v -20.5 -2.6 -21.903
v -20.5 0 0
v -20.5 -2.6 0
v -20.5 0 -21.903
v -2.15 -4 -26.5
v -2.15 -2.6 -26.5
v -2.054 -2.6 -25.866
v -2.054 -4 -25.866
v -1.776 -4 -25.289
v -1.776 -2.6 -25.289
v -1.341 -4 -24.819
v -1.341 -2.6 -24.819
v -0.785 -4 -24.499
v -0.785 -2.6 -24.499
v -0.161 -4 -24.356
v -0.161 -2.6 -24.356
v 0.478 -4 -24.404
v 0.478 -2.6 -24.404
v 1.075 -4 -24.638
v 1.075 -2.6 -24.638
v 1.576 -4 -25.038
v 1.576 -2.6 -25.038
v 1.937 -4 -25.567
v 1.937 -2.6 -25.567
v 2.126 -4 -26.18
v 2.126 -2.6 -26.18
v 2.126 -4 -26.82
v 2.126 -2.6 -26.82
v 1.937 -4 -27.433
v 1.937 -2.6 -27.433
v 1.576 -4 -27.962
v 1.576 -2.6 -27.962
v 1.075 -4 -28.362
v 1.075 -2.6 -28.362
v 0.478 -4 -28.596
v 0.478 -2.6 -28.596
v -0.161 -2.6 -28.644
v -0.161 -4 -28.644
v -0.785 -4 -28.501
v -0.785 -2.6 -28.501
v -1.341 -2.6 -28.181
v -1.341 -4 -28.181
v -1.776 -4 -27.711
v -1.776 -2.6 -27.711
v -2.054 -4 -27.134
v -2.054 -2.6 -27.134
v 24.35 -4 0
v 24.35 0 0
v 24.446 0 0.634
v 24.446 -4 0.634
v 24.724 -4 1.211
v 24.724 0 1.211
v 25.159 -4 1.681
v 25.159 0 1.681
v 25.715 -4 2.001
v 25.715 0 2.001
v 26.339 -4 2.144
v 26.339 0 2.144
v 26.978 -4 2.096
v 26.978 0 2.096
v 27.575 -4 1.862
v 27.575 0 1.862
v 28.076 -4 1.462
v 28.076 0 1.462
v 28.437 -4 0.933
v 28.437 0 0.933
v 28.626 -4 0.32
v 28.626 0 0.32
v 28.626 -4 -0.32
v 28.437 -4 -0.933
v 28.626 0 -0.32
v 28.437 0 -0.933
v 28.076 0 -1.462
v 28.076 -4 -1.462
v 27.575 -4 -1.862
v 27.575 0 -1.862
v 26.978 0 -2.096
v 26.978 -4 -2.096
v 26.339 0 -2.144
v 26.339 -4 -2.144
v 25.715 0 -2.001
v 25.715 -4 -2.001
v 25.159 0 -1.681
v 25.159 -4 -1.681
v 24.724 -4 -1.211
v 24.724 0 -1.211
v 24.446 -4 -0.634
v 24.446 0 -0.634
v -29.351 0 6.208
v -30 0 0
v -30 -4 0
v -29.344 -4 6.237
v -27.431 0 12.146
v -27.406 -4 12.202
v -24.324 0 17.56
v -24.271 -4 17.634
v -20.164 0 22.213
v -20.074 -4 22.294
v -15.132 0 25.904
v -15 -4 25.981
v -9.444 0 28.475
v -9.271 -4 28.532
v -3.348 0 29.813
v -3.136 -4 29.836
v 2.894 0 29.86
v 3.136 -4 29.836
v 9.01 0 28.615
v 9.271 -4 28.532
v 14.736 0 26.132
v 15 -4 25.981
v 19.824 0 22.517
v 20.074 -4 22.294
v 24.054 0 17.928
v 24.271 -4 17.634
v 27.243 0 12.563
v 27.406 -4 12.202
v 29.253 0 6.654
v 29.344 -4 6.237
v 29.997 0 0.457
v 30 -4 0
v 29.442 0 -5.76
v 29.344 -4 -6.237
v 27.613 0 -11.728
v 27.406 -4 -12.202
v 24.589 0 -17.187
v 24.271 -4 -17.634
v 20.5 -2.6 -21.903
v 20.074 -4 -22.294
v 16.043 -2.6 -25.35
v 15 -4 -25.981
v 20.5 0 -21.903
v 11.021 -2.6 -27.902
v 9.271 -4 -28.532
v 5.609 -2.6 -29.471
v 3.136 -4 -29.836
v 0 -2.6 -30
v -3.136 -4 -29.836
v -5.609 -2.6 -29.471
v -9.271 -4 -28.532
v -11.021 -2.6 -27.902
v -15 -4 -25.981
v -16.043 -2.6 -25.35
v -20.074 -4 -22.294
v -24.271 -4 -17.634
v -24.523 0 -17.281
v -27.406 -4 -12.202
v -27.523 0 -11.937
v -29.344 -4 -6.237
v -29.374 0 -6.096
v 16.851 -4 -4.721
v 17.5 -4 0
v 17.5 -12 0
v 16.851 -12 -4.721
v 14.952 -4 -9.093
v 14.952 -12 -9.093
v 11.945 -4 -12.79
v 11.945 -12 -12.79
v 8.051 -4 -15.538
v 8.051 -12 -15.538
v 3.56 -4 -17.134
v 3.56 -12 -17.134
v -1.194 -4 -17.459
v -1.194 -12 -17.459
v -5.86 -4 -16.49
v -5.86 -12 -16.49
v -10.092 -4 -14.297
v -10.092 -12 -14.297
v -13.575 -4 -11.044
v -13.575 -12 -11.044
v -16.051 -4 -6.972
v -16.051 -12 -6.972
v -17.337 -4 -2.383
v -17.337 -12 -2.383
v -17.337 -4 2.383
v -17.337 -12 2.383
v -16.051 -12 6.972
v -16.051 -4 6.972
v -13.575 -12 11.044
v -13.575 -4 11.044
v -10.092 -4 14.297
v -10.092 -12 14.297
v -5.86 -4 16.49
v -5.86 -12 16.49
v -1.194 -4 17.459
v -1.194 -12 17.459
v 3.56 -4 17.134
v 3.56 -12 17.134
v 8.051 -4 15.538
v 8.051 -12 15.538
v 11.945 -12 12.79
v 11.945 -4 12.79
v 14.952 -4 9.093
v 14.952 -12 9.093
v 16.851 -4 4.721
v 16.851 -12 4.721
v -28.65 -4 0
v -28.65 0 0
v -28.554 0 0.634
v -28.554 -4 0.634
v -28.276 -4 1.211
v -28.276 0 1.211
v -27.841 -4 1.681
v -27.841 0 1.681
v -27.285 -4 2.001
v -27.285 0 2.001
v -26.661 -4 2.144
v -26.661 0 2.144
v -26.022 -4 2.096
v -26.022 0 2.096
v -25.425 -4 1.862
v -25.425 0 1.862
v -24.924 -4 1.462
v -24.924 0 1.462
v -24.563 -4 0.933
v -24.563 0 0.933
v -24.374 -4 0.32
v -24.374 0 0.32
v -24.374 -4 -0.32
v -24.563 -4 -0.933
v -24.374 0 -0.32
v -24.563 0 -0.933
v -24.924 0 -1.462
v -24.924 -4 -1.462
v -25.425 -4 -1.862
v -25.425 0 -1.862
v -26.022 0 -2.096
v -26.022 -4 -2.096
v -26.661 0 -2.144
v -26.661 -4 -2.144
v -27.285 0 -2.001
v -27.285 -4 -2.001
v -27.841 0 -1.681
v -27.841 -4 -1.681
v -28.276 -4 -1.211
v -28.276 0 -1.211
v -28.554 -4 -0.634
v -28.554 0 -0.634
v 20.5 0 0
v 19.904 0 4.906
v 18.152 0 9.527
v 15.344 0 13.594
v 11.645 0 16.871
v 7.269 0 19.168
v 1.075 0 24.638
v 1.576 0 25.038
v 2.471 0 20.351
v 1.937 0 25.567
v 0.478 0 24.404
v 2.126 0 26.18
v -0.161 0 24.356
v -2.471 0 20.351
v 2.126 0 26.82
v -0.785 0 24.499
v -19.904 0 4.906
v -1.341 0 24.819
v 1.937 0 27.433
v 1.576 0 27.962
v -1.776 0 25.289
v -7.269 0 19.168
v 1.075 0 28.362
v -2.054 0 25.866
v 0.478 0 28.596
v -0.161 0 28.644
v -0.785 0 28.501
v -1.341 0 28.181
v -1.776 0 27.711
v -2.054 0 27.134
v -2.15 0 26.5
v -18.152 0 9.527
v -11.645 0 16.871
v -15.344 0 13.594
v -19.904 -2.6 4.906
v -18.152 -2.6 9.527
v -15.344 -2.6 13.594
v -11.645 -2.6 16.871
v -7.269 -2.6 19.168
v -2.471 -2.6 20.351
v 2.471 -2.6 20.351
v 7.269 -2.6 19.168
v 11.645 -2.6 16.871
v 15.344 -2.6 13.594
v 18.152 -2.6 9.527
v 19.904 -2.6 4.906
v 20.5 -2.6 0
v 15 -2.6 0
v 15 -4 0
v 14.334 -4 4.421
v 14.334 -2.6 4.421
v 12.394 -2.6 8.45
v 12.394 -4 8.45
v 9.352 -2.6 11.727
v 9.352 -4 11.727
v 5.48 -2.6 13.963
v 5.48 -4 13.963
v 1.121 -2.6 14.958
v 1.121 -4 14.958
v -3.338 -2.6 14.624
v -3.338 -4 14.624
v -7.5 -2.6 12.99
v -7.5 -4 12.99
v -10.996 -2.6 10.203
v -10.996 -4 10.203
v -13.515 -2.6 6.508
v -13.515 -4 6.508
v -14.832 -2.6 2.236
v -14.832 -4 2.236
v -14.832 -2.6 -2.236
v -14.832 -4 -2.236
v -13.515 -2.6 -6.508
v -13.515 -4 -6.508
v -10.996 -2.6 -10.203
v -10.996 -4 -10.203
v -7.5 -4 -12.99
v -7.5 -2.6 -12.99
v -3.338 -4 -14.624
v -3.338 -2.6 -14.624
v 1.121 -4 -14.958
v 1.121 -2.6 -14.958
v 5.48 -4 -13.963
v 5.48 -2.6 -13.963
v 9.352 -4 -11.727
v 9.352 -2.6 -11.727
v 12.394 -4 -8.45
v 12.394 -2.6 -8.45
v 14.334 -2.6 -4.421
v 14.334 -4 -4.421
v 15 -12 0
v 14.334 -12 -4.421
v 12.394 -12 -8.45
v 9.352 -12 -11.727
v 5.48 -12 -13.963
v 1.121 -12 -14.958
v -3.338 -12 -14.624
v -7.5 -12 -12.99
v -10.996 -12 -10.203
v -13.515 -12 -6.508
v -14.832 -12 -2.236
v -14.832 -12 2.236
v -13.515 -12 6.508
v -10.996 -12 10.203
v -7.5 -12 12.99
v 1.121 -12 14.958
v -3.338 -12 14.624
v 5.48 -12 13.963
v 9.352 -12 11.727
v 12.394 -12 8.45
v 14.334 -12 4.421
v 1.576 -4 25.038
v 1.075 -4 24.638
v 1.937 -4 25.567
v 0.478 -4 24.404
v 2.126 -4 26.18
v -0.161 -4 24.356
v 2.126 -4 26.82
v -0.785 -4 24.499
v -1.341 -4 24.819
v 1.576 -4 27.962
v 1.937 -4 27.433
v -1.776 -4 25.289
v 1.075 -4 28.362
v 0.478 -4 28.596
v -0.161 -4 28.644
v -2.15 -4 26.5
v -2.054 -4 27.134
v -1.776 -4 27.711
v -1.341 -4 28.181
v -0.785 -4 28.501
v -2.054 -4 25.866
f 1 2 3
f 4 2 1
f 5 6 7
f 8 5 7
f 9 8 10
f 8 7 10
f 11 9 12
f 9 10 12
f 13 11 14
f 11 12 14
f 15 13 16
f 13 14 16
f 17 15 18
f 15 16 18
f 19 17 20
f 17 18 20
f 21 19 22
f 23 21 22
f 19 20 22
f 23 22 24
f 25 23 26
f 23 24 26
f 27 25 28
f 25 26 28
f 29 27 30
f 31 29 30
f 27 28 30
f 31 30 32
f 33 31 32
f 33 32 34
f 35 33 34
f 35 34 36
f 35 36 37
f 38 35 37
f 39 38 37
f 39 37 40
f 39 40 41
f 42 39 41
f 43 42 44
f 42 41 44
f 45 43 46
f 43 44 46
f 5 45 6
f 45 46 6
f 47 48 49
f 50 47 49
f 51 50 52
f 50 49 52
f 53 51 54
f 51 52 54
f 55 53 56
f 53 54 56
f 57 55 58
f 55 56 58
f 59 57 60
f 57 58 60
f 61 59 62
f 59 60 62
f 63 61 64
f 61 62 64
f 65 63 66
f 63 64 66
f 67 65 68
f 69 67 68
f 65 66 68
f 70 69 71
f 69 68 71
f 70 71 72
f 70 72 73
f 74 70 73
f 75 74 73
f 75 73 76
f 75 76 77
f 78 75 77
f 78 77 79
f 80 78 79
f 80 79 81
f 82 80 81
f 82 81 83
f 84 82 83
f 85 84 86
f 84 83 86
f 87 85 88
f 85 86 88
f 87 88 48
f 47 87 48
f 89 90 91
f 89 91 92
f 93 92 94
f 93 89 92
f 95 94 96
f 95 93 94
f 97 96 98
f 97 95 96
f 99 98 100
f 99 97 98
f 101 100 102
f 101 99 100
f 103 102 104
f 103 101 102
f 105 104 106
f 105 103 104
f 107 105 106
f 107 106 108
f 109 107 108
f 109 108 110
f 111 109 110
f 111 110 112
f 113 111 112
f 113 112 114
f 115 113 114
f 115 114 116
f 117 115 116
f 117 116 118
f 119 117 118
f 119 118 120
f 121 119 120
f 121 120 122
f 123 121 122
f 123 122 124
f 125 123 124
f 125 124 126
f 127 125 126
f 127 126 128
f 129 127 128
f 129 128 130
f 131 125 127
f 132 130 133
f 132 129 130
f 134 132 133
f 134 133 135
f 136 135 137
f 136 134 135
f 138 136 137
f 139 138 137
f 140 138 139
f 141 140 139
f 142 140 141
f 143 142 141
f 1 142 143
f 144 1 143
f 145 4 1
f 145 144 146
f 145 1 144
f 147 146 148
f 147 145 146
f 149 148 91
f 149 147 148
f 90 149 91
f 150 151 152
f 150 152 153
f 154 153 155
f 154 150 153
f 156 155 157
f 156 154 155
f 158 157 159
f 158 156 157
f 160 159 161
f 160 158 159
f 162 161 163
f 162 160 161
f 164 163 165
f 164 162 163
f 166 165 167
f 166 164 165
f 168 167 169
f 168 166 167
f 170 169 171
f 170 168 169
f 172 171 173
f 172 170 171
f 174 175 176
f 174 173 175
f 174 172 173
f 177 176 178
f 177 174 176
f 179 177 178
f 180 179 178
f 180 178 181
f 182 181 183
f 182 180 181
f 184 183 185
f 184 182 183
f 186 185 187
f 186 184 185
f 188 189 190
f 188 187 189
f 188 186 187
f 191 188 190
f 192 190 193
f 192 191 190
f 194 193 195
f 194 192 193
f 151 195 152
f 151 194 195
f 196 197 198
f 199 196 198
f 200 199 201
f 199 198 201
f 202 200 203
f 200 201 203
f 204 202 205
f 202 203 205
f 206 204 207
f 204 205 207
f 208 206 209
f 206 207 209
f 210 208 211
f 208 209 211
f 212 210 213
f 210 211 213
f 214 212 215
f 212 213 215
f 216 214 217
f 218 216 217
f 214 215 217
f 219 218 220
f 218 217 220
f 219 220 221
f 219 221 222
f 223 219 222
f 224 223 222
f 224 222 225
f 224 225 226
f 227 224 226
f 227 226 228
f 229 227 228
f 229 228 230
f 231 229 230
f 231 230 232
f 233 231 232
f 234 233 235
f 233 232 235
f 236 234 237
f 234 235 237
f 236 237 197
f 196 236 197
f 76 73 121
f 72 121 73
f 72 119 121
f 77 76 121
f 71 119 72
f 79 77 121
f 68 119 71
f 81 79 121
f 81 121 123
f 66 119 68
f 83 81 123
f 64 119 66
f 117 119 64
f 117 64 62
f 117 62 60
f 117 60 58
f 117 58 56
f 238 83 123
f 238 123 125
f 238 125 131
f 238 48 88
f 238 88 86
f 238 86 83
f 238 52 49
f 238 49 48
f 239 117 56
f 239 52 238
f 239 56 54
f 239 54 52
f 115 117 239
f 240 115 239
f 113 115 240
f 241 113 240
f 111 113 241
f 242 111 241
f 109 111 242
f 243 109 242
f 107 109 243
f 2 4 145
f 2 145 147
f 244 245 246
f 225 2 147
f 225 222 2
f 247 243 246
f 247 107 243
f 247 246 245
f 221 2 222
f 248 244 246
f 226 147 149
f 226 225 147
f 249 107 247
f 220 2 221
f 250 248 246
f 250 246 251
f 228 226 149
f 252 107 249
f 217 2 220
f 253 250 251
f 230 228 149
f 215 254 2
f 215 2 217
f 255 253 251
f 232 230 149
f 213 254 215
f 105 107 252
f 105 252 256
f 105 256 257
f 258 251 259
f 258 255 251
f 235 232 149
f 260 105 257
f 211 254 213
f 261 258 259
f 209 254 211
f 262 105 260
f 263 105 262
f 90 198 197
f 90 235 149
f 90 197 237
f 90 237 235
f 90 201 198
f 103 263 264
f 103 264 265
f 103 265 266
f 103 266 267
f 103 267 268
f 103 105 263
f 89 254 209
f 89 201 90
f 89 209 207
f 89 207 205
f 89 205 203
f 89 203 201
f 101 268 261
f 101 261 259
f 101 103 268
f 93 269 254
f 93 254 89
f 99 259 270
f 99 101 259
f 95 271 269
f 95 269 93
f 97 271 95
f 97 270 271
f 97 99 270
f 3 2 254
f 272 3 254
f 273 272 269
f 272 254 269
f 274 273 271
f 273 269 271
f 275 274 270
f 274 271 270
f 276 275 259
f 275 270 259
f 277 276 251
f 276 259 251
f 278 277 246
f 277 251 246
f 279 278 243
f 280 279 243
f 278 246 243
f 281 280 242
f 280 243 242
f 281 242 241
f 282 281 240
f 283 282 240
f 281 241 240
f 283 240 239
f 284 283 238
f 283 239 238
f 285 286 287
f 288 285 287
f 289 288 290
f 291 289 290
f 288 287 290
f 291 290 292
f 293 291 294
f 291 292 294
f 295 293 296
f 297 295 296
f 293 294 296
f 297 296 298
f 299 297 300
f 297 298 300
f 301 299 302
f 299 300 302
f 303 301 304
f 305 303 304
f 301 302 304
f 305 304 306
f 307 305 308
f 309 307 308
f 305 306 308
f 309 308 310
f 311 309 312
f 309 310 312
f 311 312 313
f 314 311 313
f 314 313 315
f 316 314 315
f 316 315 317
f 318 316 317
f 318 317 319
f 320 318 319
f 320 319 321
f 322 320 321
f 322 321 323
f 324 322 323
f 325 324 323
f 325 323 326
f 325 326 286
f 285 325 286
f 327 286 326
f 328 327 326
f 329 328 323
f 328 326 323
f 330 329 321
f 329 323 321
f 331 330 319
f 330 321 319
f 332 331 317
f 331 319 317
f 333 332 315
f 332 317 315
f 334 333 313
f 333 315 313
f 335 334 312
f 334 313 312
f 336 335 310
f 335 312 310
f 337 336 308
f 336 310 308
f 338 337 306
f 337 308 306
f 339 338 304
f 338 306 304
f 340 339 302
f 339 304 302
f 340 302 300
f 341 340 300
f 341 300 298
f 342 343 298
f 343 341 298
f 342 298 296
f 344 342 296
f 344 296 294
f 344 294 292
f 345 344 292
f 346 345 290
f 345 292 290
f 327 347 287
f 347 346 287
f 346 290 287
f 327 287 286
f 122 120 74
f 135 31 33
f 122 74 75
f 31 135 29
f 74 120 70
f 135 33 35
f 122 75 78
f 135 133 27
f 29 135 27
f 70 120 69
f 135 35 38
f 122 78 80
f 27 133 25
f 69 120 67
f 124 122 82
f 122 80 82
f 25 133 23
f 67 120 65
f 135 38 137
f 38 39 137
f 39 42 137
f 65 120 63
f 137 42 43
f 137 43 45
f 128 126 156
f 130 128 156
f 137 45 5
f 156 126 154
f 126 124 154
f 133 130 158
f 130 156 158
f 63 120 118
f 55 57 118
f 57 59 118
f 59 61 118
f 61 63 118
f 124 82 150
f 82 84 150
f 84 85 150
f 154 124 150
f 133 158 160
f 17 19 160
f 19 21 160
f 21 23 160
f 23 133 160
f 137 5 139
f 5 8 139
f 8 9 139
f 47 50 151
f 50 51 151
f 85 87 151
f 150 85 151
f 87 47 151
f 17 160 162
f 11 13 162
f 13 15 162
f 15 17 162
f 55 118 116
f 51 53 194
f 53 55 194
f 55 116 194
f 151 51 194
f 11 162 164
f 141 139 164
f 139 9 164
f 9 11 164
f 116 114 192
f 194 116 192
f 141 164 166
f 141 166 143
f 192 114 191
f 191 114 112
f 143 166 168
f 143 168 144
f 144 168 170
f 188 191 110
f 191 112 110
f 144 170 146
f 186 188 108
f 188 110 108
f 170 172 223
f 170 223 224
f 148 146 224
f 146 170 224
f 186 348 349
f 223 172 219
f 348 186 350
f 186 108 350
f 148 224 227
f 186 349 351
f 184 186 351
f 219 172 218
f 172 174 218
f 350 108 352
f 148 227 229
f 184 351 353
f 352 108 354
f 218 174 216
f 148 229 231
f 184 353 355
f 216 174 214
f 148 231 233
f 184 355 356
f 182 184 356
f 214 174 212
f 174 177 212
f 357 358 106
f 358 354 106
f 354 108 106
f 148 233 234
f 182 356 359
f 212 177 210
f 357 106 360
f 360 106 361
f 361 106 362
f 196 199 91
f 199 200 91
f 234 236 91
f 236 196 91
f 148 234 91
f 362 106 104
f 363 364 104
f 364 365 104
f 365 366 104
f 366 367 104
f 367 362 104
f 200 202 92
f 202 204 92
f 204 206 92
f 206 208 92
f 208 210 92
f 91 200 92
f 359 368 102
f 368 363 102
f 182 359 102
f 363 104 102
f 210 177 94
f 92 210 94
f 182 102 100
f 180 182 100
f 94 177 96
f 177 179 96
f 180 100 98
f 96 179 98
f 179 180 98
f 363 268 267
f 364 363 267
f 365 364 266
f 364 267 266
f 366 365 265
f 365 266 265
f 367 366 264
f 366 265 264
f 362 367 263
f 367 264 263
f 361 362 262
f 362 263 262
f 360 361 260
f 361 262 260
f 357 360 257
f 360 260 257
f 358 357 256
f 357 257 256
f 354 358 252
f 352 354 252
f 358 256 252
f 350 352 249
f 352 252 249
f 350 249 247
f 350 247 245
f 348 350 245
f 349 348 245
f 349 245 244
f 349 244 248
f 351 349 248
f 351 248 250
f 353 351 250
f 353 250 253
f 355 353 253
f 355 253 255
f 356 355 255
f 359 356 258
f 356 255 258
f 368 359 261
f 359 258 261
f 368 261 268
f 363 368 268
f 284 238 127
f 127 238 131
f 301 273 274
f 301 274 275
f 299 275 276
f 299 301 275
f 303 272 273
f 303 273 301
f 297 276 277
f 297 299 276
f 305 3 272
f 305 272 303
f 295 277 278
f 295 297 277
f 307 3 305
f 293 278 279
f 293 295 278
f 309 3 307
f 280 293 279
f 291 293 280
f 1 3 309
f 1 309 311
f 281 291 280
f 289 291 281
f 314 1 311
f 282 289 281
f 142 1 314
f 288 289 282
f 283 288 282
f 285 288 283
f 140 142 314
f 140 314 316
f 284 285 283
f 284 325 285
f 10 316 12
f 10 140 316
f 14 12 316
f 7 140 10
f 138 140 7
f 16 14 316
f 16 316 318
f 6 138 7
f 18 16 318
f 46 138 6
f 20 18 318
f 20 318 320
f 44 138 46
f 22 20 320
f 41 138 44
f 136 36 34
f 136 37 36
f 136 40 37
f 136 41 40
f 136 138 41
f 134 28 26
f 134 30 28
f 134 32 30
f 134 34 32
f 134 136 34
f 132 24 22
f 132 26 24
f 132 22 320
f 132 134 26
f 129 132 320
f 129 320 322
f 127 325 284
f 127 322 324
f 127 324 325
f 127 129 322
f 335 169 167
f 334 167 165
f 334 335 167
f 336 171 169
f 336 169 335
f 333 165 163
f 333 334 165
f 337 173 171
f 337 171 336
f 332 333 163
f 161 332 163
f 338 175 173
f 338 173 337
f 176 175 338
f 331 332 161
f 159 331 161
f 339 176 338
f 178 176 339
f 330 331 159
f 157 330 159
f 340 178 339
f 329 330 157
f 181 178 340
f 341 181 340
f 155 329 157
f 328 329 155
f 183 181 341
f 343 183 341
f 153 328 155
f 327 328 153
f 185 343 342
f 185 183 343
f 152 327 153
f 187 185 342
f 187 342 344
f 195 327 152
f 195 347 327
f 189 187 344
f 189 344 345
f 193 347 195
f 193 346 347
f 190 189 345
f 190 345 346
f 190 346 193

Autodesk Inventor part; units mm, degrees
ref_plane "YZ Plane" through (0, 0, 0) normal (1, 0, 0) x (0, 1, 0)
ref_plane "XZ Plane" through (0, 0, 0) normal (0, 1, 0) x (-1, 0, 0)
ref_plane "XY Plane" through (0, 0, 0) normal (0, 0, 1) x (1, 0, 0)
sketch "Sketch1" plane through (0, 0, 0) normal (0, 1, 0) x (-1, 0, 0)
  circle A0 centre (0, 0) radius 30
  circle A1 centre (0, 0) radius 22.5
  circle A2 centre (0, 0) radius 26.5
  circle A3 centre (0, 26.5) radius 2.15
  circle A4 centre (-26.5, 0) radius 2.15
  circle A5 centre (0, -26.5) radius 2.15
  circle A6 centre (26.5, 0) radius 2.15
  dimension "d3" = 53
  dimension "d0" = 60
  dimension "d1" = 45
  dimension "d4" = 4.3
  dimension "d7" = 360
extrude "Extrusion1" add sketch "Sketch1" against normal blind 4 contours A0 | A1 | A6 A2 A5 A4 A3
sketch "Sketch2" plane through (0, 0, 0) normal (0, 1, 0) x (1, 0, 0)
  circle A0 centre (0, 0) radius 20.5
  line L0 (-20.5, 0) -> (-20.5, 21.9032)
  circle A1 centre (0, 0) radius 30 projected
  line L1 (20.5, 0) -> (20.5, 21.9032)
  circle A2 centre (0, 0) radius 30
  dimension "d11" = 41
extrude "Extrusion2" cut sketch "Sketch2" against normal blind 2.6 contours A0 | A0 L0 A1 L1 picked at (-0.8237, 26.6681)
sketch "Sketch3" plane through (0, -4, 0) normal (0, -1, 0) x (1, 0, 0)
  circle A0 centre (0, 0) radius 15
  dimension "d14" = 30
extrude "Extrusion3" cut sketch "Sketch3" against normal through all
sketch "Sketch4" plane through (0, -4, 0) normal (0, -1, 0) x (1, 0, 0)
  circle A0 centre (0, 0) radius 15
  circle A1 centre (0, 0) radius 17.5
  dimension "d17" = 30
  dimension "d18" = 35
extrude "Extrusion4" add sketch "Sketch4" along normal blind 8
properties part number "LoadCellMount"
